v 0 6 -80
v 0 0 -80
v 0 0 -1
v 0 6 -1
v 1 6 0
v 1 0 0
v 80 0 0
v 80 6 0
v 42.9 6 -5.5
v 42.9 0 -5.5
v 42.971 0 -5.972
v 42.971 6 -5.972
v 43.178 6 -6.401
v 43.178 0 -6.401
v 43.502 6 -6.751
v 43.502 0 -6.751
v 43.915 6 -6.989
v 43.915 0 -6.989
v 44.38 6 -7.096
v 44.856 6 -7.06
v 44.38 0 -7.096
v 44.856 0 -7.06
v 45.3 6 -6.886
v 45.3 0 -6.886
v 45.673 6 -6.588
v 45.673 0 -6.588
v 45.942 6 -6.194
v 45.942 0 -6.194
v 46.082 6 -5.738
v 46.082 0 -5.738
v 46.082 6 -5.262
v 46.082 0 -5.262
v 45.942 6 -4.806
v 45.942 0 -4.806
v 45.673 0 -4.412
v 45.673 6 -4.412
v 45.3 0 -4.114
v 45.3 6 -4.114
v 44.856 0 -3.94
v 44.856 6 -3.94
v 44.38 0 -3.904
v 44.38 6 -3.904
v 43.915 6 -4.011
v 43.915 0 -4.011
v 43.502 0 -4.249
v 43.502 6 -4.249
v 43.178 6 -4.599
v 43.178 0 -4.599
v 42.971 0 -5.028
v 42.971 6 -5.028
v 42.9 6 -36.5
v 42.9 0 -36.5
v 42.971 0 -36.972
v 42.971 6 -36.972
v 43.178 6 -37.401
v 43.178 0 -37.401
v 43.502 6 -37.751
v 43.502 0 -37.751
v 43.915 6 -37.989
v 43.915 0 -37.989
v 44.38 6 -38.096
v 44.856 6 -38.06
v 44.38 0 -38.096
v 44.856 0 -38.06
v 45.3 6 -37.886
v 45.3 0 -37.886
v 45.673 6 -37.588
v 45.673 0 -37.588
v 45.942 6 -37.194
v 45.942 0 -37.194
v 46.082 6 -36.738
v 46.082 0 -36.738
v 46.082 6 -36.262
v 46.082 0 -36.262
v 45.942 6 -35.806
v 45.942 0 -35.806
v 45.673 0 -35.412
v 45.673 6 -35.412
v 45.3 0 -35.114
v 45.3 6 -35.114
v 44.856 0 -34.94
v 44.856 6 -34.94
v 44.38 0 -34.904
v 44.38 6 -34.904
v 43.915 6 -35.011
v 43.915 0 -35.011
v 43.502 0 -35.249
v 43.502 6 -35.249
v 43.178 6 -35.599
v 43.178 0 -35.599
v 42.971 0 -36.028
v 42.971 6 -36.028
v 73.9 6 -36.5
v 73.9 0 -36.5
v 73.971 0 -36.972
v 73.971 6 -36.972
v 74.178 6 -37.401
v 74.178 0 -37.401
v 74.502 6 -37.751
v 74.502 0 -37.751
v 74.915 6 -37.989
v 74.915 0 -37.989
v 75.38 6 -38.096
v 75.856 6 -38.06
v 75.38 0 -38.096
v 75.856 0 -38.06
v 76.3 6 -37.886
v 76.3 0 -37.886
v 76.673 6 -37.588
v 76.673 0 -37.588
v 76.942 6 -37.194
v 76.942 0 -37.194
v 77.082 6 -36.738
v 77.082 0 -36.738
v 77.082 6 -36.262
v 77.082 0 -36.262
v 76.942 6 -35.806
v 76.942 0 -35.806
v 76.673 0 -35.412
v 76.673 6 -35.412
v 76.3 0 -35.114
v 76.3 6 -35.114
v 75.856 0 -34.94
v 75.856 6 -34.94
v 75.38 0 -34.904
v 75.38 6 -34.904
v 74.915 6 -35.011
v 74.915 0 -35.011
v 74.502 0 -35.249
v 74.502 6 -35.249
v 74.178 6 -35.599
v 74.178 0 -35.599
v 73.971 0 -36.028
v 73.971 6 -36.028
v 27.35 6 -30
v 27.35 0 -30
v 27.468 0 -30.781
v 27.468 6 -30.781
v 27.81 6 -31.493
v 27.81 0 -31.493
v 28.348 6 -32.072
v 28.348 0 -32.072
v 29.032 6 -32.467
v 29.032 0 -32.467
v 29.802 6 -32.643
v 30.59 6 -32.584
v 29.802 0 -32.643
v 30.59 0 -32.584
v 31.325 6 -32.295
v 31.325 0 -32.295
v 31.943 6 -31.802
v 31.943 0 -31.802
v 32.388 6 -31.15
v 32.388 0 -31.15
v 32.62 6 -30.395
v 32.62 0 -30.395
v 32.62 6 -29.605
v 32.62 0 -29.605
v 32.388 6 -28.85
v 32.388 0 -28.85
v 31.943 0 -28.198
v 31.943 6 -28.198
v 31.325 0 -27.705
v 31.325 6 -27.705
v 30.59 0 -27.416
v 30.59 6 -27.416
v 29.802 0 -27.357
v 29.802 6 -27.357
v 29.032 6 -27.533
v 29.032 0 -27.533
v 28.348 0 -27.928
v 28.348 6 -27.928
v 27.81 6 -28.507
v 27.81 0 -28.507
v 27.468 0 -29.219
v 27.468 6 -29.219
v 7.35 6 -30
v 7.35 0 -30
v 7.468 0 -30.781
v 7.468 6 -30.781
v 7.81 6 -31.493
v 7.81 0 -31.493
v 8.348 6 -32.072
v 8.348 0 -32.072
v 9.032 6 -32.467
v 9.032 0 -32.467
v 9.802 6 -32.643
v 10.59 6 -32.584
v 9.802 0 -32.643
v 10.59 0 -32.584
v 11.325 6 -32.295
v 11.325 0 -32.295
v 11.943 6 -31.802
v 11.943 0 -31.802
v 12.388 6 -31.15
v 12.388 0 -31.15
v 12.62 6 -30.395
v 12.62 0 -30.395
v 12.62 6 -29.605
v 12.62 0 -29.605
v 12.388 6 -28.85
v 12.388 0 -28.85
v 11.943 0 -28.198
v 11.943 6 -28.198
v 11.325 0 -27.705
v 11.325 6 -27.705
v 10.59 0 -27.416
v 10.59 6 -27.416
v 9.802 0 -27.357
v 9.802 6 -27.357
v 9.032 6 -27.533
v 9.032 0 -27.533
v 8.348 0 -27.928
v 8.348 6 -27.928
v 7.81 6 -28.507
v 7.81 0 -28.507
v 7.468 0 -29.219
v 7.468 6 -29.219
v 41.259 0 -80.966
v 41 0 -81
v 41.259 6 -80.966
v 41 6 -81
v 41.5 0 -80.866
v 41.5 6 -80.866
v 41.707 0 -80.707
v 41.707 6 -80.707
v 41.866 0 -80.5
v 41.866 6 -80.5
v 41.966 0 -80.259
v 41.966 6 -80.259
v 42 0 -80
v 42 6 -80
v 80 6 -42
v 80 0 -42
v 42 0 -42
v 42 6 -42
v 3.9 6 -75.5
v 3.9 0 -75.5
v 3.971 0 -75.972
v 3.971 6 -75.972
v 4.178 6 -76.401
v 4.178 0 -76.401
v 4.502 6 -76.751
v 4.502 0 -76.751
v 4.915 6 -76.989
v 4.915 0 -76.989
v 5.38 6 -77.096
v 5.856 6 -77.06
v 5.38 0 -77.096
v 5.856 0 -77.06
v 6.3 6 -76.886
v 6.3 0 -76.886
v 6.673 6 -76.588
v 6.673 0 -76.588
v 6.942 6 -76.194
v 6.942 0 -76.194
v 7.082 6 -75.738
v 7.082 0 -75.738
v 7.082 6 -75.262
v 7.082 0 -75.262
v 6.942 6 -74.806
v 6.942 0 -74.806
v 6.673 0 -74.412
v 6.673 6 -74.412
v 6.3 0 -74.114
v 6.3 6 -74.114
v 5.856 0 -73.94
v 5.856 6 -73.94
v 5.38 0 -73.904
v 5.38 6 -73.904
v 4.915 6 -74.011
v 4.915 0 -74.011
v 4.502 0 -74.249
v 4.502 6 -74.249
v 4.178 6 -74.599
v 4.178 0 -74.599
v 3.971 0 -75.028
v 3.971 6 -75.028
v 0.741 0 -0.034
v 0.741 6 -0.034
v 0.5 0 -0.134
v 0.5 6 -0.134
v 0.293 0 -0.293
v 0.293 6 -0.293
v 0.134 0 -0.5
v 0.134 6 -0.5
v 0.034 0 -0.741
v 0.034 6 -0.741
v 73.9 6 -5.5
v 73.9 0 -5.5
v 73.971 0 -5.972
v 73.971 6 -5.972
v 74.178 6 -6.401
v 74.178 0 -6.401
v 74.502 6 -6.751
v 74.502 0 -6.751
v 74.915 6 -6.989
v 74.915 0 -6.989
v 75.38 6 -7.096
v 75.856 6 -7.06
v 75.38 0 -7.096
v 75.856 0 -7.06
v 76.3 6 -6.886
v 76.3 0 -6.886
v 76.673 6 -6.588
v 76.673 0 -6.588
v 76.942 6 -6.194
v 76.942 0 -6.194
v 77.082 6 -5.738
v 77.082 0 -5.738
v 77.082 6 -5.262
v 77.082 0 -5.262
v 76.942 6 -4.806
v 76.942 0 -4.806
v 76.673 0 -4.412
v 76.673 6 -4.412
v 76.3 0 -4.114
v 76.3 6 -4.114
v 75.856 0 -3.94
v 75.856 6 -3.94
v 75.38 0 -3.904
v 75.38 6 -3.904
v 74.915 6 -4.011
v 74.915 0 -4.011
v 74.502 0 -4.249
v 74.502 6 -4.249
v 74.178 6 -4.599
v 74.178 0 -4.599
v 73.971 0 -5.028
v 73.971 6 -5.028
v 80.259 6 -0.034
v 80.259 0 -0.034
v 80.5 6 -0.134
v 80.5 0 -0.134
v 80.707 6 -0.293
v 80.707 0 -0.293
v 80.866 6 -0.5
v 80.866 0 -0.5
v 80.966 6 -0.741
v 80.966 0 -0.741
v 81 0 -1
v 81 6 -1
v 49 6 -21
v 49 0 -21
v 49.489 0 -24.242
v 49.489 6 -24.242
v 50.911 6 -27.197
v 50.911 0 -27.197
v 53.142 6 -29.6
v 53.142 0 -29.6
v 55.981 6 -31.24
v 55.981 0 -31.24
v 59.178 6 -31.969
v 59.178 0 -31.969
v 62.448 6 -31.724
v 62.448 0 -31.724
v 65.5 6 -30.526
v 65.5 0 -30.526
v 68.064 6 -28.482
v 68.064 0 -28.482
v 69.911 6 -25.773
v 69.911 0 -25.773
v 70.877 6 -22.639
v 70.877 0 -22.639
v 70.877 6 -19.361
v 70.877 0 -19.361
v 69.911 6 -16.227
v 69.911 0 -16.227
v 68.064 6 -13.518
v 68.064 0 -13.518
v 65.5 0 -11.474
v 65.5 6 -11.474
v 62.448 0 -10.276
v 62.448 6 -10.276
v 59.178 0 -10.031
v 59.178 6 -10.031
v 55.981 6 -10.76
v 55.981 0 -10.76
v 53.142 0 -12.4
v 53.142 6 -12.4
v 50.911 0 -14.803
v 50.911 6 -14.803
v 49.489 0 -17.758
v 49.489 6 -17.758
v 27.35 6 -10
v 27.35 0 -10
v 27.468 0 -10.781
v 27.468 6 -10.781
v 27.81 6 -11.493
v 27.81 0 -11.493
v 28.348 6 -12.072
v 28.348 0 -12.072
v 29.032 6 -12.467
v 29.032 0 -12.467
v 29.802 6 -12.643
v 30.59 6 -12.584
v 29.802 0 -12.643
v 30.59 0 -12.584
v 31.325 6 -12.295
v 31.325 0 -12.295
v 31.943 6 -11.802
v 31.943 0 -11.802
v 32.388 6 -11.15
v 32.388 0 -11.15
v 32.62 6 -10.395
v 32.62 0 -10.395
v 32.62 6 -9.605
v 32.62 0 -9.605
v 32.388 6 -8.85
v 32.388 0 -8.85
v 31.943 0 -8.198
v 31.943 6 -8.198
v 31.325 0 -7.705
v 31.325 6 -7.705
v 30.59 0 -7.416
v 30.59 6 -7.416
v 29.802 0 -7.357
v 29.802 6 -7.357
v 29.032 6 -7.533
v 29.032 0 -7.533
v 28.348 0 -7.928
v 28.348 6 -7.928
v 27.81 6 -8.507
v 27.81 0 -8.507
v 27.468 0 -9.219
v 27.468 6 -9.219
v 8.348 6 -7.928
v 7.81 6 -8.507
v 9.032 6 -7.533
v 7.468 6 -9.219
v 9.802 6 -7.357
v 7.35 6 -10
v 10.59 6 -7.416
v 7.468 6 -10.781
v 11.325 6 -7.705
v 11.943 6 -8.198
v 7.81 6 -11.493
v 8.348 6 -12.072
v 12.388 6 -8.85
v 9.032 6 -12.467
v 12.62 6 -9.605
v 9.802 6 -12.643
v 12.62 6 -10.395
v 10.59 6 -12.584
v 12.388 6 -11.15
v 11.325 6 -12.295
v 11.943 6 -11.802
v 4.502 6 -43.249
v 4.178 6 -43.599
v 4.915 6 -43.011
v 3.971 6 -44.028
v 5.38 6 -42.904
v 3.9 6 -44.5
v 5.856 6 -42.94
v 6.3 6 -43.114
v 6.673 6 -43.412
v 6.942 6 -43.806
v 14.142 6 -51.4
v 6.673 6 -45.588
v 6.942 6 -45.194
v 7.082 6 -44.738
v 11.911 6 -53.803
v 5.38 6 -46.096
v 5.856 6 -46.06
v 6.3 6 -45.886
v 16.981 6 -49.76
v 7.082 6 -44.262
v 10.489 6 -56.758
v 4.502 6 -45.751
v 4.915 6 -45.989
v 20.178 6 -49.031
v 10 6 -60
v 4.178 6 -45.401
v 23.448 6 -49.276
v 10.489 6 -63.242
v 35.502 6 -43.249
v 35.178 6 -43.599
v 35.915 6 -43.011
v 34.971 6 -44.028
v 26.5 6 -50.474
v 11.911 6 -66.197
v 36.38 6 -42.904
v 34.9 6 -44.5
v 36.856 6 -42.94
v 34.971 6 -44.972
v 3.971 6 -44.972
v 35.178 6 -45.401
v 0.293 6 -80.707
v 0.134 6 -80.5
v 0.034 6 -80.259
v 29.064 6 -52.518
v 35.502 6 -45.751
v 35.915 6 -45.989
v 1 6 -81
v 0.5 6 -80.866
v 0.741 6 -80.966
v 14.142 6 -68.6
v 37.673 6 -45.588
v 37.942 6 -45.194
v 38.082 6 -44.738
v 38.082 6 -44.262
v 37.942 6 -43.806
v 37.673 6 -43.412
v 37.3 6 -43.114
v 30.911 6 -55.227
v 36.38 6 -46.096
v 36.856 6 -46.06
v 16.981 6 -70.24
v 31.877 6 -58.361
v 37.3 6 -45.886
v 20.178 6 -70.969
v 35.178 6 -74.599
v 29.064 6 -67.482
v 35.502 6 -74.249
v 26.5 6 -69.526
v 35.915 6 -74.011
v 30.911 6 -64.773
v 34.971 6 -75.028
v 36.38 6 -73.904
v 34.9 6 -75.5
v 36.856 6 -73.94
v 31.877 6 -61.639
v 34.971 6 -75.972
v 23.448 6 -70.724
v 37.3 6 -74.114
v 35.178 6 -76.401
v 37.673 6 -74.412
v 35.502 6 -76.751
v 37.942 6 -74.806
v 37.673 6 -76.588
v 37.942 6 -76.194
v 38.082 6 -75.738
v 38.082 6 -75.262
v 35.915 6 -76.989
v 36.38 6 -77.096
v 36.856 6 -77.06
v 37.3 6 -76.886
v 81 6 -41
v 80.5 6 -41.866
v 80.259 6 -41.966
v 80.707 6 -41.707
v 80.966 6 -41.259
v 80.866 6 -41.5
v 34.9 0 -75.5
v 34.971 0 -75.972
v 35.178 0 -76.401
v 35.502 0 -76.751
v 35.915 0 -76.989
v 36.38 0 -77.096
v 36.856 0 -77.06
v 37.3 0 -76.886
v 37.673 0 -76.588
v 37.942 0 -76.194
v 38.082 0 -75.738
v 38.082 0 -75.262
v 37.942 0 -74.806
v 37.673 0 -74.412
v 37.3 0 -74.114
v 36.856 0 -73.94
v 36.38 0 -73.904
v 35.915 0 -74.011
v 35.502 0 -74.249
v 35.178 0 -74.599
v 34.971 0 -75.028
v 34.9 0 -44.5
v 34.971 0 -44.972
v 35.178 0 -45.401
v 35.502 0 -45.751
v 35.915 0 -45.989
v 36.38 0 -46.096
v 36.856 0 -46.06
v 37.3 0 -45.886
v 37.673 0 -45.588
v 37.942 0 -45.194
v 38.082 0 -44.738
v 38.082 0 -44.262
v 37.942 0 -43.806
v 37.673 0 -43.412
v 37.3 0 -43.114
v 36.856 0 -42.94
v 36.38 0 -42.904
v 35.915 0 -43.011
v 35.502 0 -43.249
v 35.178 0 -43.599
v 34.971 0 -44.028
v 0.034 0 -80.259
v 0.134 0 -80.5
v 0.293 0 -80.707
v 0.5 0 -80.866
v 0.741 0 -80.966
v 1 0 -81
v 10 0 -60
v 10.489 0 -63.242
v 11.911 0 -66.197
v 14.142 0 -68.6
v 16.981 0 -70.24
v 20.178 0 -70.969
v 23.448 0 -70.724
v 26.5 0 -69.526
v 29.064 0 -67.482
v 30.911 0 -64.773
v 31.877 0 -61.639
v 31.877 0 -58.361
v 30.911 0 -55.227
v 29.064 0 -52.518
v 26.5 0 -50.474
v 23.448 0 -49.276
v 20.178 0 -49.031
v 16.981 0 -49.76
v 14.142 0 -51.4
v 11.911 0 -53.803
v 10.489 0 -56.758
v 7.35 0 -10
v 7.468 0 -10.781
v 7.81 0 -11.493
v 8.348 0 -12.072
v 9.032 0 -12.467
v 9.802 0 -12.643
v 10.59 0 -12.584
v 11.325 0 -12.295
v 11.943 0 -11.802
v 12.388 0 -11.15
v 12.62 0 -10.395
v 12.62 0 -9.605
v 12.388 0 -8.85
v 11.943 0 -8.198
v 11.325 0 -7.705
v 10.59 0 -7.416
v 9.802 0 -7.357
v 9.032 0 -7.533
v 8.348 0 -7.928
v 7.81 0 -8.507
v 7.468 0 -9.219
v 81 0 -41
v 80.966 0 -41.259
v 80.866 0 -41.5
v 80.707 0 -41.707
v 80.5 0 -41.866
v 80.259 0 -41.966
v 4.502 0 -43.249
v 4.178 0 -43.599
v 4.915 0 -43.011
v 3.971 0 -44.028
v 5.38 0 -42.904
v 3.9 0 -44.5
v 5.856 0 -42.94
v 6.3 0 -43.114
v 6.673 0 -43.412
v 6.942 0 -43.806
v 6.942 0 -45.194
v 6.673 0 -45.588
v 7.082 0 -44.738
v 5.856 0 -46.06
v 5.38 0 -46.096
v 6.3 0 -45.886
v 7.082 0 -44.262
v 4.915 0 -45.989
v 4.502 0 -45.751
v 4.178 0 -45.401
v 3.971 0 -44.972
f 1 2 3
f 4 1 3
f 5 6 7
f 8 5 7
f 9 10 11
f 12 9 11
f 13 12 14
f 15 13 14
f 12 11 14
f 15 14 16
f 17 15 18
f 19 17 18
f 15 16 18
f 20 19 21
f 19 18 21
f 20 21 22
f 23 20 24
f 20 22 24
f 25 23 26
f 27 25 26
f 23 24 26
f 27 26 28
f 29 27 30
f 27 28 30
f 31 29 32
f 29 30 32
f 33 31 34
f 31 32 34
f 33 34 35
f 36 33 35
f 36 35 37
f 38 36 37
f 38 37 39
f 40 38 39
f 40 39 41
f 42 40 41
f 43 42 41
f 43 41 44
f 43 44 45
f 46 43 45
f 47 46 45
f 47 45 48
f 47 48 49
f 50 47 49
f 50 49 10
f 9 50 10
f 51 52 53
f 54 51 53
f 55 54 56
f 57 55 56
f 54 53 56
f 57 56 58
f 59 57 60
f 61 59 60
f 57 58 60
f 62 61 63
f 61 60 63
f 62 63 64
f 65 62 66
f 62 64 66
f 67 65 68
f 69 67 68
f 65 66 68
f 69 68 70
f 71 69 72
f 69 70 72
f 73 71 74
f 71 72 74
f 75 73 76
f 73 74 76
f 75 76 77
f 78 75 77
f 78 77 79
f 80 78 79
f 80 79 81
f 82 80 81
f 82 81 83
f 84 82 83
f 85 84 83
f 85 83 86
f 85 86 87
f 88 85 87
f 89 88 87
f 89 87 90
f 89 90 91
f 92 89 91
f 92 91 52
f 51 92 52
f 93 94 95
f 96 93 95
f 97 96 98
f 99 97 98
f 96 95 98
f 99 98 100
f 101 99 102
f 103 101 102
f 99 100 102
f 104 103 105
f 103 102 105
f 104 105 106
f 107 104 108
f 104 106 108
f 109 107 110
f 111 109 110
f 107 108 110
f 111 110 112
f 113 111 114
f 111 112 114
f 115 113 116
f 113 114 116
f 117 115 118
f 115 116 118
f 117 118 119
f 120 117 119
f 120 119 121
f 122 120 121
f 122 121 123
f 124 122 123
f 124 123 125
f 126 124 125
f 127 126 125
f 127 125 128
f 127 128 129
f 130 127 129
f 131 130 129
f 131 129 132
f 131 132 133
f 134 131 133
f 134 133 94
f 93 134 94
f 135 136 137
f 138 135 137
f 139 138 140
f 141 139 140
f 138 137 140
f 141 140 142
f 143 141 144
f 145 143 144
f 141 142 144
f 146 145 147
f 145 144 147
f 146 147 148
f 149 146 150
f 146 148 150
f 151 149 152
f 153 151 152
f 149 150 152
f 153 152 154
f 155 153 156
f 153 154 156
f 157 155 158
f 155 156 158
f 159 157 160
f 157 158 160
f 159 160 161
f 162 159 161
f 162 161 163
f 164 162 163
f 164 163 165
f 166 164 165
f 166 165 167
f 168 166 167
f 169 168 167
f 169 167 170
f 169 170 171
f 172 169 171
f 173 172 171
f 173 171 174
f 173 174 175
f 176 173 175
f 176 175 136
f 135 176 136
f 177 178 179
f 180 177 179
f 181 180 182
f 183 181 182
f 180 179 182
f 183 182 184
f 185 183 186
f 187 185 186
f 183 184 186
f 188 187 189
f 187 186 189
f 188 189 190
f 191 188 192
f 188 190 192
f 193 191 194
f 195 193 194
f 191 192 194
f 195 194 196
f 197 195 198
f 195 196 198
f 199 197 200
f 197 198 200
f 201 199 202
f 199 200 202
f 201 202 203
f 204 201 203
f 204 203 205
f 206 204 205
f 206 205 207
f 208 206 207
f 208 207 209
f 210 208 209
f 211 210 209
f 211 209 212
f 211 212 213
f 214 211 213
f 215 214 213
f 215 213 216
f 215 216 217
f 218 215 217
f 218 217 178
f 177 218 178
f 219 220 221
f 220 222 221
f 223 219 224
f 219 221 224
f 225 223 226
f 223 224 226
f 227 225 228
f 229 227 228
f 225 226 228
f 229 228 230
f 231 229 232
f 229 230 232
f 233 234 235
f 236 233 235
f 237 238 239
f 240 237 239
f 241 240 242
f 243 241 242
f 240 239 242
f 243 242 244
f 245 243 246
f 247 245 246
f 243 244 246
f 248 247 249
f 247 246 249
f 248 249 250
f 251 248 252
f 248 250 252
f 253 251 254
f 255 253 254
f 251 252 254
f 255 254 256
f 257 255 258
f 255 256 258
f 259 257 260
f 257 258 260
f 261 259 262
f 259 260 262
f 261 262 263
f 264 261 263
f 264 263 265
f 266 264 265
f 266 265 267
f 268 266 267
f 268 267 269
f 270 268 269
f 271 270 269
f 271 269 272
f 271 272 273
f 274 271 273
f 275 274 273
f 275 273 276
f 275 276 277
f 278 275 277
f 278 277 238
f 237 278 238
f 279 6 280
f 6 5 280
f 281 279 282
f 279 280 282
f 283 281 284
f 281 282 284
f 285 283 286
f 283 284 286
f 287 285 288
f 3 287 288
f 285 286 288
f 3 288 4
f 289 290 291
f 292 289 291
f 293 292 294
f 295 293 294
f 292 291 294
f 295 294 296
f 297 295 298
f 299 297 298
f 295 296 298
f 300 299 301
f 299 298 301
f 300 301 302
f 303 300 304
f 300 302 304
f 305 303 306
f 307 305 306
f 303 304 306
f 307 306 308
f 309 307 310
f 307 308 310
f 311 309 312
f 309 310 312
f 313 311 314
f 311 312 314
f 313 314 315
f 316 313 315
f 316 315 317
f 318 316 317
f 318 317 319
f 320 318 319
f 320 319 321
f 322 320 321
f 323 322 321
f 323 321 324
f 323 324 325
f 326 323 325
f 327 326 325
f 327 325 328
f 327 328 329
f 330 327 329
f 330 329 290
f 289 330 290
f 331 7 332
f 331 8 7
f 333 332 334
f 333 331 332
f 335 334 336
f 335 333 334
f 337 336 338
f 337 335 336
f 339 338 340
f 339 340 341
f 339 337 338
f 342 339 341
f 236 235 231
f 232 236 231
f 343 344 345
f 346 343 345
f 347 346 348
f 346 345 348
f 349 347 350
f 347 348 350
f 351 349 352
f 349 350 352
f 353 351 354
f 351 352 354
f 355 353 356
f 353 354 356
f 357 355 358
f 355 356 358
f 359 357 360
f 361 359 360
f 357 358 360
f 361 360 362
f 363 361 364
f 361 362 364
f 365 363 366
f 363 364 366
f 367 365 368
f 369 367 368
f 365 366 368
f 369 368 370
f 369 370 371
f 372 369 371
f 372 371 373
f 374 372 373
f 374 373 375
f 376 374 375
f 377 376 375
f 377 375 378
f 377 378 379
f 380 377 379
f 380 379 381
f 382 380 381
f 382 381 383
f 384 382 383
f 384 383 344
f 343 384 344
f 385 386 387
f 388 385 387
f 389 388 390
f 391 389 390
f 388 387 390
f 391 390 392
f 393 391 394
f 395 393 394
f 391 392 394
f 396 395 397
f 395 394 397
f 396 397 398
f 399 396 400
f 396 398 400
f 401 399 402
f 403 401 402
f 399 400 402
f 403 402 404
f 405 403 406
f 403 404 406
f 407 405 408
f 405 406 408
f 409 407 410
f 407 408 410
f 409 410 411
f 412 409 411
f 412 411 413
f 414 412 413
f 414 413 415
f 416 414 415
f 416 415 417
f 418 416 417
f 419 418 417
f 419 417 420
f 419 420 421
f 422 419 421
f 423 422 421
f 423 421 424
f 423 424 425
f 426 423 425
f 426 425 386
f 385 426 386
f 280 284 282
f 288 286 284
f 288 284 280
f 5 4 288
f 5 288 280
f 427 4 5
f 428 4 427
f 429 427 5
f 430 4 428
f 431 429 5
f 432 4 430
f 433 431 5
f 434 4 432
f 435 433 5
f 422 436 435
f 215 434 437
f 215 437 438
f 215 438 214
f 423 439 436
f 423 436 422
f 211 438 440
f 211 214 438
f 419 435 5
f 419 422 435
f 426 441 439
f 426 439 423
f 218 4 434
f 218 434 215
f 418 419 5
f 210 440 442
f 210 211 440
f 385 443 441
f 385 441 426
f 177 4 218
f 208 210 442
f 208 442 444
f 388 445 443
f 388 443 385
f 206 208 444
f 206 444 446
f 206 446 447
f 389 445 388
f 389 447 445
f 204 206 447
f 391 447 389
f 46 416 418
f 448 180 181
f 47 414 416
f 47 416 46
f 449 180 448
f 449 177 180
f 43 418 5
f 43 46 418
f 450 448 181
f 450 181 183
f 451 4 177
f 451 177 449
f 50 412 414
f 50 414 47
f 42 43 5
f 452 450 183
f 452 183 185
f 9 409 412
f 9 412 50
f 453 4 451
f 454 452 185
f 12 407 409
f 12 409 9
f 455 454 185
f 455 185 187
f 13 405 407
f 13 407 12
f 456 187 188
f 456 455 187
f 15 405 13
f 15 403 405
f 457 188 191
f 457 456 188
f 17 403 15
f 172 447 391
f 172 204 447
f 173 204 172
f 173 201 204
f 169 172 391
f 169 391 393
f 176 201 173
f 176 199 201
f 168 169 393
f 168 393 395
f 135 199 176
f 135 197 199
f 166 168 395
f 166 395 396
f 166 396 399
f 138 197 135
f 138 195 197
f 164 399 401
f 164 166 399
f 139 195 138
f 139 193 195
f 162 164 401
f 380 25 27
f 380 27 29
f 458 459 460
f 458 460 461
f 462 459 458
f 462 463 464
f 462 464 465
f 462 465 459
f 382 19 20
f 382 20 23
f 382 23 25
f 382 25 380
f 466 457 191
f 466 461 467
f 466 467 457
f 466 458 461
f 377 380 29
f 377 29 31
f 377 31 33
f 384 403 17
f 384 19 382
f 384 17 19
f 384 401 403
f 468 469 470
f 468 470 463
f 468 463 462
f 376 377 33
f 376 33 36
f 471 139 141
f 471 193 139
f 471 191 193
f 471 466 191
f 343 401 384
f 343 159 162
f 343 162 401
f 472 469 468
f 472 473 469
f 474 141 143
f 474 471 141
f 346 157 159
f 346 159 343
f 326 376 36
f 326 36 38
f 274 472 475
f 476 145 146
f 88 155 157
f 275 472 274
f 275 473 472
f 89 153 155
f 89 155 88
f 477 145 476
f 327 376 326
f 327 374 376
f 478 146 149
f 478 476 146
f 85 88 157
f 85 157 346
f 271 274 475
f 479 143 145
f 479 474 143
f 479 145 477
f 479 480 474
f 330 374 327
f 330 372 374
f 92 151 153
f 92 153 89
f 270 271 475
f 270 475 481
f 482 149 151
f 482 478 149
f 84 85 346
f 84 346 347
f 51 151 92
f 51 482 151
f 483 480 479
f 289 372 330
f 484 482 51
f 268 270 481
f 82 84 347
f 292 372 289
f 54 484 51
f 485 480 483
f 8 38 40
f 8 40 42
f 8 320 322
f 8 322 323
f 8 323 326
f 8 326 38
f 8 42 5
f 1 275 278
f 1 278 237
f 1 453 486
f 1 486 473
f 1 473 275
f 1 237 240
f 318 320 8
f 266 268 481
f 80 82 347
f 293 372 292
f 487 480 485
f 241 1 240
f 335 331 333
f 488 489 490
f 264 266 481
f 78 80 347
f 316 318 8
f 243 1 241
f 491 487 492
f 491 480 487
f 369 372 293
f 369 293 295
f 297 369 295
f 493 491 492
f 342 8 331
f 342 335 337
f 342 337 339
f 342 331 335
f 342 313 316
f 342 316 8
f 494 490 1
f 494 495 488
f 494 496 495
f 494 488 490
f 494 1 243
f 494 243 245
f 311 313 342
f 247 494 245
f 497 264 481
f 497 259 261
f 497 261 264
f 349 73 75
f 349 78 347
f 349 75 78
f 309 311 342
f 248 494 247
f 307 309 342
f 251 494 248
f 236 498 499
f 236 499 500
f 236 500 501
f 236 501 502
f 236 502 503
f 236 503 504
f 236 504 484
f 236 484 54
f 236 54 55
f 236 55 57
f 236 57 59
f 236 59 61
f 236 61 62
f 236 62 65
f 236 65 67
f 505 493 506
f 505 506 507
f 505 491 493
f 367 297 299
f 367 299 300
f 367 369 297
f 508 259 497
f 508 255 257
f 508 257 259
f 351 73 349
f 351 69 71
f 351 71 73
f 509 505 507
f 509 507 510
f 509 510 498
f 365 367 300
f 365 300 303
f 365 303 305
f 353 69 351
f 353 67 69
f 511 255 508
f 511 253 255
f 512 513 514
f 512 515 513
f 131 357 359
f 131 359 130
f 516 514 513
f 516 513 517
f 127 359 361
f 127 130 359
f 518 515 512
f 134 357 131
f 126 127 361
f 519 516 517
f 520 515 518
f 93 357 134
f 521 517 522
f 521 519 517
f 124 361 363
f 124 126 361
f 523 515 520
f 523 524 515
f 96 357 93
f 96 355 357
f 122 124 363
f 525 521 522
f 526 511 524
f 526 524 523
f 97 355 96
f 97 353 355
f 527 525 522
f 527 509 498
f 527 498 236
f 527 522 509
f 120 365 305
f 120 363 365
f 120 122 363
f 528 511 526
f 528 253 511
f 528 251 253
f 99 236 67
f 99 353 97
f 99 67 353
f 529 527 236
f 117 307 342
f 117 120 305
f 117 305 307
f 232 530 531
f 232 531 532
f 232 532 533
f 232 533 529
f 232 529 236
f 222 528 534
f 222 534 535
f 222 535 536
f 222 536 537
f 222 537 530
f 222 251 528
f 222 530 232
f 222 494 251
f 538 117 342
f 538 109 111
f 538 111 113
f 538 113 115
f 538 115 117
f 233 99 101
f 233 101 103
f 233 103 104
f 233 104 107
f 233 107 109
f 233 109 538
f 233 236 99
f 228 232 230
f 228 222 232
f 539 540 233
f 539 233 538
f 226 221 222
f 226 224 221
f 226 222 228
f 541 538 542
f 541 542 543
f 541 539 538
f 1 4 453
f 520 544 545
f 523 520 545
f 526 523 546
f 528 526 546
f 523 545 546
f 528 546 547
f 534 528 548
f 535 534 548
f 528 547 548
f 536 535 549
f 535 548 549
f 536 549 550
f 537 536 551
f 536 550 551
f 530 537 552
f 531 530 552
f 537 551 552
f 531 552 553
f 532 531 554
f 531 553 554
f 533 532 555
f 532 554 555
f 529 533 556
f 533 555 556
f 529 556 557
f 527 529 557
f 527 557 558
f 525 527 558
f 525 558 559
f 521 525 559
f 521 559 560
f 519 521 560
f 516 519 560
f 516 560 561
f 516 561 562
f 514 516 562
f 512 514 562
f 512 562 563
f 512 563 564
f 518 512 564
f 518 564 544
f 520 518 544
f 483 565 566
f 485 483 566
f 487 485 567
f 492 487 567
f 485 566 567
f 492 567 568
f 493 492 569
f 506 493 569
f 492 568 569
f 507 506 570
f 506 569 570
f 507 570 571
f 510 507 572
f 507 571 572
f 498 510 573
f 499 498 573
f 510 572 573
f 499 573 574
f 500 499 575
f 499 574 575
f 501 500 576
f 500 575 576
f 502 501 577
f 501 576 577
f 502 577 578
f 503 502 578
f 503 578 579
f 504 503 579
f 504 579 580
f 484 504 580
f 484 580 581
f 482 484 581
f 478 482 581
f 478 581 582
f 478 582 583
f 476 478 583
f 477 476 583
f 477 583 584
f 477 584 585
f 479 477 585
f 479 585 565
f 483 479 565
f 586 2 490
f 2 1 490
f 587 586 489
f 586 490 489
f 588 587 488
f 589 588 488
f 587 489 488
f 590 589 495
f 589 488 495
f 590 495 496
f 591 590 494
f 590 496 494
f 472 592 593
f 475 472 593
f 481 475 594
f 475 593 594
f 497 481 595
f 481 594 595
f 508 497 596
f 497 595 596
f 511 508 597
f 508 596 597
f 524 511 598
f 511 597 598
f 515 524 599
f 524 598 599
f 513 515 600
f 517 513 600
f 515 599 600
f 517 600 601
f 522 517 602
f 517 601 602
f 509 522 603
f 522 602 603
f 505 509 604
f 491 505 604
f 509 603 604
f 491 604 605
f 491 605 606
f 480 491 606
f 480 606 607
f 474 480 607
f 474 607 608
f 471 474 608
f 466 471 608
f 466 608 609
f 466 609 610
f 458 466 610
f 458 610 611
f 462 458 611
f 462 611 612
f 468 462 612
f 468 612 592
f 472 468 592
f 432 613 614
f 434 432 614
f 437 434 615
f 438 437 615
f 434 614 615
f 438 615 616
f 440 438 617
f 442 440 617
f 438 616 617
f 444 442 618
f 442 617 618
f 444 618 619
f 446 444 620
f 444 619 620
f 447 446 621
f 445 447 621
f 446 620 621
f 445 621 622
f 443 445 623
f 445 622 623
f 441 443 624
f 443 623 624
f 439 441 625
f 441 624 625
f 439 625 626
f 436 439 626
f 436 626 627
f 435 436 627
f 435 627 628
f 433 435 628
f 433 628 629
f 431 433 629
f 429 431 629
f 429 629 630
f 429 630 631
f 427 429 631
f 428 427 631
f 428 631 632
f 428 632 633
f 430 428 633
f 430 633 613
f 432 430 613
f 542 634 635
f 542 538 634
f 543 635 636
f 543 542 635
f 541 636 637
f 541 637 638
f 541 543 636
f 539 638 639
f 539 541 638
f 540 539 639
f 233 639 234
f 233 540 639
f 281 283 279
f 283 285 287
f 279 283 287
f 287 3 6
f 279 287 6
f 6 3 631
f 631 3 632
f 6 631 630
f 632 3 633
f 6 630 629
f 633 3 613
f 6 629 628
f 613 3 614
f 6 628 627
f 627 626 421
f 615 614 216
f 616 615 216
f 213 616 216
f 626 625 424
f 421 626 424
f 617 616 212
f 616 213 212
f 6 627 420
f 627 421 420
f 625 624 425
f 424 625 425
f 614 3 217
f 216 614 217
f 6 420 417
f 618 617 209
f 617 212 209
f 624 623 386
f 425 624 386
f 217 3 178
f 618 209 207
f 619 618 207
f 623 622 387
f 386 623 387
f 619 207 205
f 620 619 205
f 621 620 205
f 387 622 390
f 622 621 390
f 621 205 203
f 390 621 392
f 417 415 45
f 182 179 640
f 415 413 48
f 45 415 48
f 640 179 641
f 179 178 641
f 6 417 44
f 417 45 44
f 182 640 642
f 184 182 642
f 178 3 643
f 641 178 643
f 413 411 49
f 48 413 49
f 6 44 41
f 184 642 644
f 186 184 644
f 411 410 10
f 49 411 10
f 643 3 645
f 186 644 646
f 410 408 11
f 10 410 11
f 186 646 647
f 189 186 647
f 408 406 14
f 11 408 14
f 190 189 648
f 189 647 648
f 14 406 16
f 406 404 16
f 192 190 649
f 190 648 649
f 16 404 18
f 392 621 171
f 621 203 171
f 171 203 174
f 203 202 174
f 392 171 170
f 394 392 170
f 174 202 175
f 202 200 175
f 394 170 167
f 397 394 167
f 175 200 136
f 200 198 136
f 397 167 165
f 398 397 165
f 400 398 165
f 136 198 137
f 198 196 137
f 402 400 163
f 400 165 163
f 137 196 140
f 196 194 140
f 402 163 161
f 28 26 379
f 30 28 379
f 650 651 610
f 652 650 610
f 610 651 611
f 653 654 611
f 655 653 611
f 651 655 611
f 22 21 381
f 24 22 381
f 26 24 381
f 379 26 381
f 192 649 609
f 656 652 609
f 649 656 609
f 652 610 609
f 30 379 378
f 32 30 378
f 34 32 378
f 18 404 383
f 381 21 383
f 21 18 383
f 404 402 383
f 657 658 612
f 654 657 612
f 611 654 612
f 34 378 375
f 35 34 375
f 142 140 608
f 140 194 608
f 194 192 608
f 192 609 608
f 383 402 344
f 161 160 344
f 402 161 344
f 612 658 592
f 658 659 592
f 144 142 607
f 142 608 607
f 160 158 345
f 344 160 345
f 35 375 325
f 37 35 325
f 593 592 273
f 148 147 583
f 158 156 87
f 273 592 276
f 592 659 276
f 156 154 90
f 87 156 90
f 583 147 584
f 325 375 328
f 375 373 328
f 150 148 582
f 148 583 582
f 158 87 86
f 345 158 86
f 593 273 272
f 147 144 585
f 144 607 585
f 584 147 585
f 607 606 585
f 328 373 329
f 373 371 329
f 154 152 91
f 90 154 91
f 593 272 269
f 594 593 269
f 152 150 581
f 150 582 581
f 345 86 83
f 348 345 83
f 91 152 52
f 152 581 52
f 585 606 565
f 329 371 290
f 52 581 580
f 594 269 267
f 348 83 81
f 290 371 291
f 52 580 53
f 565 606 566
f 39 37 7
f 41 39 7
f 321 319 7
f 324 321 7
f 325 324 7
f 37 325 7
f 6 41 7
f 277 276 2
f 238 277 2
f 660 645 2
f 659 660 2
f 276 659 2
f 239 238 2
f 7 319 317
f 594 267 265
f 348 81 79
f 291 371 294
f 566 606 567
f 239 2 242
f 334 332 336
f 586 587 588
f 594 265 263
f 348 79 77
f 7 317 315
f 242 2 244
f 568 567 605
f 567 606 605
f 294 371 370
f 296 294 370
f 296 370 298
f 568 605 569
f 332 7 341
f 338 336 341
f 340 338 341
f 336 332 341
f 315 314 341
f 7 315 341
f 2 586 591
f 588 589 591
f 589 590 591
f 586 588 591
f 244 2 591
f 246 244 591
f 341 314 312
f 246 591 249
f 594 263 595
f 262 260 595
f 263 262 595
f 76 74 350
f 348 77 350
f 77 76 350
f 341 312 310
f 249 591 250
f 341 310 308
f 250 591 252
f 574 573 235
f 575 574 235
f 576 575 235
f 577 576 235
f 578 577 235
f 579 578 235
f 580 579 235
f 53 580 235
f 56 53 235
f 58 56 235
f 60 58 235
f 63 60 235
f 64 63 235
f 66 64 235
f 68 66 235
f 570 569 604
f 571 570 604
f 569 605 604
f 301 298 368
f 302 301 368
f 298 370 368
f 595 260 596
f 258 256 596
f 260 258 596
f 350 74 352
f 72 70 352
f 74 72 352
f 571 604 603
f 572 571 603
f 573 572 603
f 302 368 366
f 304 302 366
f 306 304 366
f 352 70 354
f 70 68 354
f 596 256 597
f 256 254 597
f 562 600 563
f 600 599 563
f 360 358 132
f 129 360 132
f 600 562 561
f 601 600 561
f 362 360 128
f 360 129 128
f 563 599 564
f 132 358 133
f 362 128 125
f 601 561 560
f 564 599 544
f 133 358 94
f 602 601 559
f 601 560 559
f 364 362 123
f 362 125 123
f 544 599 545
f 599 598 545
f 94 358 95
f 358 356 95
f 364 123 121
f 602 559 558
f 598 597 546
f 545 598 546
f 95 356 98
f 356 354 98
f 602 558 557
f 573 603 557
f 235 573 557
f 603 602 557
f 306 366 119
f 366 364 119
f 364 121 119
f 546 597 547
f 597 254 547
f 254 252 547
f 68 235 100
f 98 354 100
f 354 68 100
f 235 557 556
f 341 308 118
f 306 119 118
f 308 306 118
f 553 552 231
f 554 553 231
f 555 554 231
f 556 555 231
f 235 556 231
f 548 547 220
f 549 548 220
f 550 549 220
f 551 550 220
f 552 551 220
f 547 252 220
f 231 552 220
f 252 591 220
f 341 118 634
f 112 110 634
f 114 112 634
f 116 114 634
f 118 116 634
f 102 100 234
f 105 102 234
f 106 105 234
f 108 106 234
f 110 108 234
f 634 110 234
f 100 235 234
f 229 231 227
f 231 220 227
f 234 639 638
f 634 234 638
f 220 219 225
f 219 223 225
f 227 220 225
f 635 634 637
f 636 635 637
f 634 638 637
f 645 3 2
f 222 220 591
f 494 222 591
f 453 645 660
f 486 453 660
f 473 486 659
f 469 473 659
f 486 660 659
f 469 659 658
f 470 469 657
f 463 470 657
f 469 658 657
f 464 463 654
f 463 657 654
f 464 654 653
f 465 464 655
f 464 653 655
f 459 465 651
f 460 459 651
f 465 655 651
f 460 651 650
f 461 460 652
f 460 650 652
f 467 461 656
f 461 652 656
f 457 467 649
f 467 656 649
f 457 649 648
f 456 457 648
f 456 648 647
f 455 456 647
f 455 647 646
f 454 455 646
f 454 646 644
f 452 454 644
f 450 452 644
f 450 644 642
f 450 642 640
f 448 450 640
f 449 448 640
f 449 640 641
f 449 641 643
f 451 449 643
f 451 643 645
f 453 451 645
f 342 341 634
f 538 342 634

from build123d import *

# Parameters (mm, degrees)
BOSS_EXTRUDE1_DEPTH        = 6
M5_CLEARANCE_HOLE1_D       = 5.3
M3_CLEARANCE_HOLE1_D       = 3.2
F_22_0_22_DIAMETER_HOLE1_D = 22
FILLET1_R                  = 1


with BuildPart() as part:
    # Sketch1 → Boss-Extrude1 (new body)
    with BuildSketch(Plane(origin=(0, 0, 0), x_dir=(1, 0, 0), z_dir=(0, 1, 0))):
        Polygon((0, 0), (81, 0), (81, 42), (42, 42), (42, 81), (0, 81), align=None)
    extrude(amount=BOSS_EXTRUDE1_DEPTH)

    # M5 Clearance Hole1 (through all)
    with Locations(Plane(origin=(0, 6, 0), x_dir=(1, 0, 0), z_dir=(0, 1, 0))):
        with Locations((10, 30), (30, 30), (30, 10), (10, 10)):
            Hole(M5_CLEARANCE_HOLE1_D / 2)

    # M3 Clearance Hole1 (through all)
    with Locations(Plane(origin=(0, 6, 0), x_dir=(1, 0, 0), z_dir=(0, 1, 0))):
        with Locations((5.5, 44.5), (36.5, 44.5), (36.5, 75.5), (5.5, 75.5), (44.5, 36.5), (44.5, 5.5), (75.5, 5.5), (75.5, 36.5)):
            Hole(M3_CLEARANCE_HOLE1_D / 2)

    # Ø22.0 (22) Diameter Hole1 (through all)
    with Locations(Plane(origin=(0, 6, 0), x_dir=(1, 0, 0), z_dir=(0, 1, 0))):
        with Locations((60, 21), (21, 60)):
            Hole(F_22_0_22_DIAMETER_HOLE1_D / 2)

    # Fillet1
    fillet1_edges = [part.edges().sort_by_distance(p)[0] for p in [
        (0, 3, -81),
        (42, 3, -81),
        (81, 3, -42),
        (81, 3, 0),
        (0, 3, 0),
    ]]
    fillet(fillet1_edges, radius=FILLET1_R)


solid = part.part
